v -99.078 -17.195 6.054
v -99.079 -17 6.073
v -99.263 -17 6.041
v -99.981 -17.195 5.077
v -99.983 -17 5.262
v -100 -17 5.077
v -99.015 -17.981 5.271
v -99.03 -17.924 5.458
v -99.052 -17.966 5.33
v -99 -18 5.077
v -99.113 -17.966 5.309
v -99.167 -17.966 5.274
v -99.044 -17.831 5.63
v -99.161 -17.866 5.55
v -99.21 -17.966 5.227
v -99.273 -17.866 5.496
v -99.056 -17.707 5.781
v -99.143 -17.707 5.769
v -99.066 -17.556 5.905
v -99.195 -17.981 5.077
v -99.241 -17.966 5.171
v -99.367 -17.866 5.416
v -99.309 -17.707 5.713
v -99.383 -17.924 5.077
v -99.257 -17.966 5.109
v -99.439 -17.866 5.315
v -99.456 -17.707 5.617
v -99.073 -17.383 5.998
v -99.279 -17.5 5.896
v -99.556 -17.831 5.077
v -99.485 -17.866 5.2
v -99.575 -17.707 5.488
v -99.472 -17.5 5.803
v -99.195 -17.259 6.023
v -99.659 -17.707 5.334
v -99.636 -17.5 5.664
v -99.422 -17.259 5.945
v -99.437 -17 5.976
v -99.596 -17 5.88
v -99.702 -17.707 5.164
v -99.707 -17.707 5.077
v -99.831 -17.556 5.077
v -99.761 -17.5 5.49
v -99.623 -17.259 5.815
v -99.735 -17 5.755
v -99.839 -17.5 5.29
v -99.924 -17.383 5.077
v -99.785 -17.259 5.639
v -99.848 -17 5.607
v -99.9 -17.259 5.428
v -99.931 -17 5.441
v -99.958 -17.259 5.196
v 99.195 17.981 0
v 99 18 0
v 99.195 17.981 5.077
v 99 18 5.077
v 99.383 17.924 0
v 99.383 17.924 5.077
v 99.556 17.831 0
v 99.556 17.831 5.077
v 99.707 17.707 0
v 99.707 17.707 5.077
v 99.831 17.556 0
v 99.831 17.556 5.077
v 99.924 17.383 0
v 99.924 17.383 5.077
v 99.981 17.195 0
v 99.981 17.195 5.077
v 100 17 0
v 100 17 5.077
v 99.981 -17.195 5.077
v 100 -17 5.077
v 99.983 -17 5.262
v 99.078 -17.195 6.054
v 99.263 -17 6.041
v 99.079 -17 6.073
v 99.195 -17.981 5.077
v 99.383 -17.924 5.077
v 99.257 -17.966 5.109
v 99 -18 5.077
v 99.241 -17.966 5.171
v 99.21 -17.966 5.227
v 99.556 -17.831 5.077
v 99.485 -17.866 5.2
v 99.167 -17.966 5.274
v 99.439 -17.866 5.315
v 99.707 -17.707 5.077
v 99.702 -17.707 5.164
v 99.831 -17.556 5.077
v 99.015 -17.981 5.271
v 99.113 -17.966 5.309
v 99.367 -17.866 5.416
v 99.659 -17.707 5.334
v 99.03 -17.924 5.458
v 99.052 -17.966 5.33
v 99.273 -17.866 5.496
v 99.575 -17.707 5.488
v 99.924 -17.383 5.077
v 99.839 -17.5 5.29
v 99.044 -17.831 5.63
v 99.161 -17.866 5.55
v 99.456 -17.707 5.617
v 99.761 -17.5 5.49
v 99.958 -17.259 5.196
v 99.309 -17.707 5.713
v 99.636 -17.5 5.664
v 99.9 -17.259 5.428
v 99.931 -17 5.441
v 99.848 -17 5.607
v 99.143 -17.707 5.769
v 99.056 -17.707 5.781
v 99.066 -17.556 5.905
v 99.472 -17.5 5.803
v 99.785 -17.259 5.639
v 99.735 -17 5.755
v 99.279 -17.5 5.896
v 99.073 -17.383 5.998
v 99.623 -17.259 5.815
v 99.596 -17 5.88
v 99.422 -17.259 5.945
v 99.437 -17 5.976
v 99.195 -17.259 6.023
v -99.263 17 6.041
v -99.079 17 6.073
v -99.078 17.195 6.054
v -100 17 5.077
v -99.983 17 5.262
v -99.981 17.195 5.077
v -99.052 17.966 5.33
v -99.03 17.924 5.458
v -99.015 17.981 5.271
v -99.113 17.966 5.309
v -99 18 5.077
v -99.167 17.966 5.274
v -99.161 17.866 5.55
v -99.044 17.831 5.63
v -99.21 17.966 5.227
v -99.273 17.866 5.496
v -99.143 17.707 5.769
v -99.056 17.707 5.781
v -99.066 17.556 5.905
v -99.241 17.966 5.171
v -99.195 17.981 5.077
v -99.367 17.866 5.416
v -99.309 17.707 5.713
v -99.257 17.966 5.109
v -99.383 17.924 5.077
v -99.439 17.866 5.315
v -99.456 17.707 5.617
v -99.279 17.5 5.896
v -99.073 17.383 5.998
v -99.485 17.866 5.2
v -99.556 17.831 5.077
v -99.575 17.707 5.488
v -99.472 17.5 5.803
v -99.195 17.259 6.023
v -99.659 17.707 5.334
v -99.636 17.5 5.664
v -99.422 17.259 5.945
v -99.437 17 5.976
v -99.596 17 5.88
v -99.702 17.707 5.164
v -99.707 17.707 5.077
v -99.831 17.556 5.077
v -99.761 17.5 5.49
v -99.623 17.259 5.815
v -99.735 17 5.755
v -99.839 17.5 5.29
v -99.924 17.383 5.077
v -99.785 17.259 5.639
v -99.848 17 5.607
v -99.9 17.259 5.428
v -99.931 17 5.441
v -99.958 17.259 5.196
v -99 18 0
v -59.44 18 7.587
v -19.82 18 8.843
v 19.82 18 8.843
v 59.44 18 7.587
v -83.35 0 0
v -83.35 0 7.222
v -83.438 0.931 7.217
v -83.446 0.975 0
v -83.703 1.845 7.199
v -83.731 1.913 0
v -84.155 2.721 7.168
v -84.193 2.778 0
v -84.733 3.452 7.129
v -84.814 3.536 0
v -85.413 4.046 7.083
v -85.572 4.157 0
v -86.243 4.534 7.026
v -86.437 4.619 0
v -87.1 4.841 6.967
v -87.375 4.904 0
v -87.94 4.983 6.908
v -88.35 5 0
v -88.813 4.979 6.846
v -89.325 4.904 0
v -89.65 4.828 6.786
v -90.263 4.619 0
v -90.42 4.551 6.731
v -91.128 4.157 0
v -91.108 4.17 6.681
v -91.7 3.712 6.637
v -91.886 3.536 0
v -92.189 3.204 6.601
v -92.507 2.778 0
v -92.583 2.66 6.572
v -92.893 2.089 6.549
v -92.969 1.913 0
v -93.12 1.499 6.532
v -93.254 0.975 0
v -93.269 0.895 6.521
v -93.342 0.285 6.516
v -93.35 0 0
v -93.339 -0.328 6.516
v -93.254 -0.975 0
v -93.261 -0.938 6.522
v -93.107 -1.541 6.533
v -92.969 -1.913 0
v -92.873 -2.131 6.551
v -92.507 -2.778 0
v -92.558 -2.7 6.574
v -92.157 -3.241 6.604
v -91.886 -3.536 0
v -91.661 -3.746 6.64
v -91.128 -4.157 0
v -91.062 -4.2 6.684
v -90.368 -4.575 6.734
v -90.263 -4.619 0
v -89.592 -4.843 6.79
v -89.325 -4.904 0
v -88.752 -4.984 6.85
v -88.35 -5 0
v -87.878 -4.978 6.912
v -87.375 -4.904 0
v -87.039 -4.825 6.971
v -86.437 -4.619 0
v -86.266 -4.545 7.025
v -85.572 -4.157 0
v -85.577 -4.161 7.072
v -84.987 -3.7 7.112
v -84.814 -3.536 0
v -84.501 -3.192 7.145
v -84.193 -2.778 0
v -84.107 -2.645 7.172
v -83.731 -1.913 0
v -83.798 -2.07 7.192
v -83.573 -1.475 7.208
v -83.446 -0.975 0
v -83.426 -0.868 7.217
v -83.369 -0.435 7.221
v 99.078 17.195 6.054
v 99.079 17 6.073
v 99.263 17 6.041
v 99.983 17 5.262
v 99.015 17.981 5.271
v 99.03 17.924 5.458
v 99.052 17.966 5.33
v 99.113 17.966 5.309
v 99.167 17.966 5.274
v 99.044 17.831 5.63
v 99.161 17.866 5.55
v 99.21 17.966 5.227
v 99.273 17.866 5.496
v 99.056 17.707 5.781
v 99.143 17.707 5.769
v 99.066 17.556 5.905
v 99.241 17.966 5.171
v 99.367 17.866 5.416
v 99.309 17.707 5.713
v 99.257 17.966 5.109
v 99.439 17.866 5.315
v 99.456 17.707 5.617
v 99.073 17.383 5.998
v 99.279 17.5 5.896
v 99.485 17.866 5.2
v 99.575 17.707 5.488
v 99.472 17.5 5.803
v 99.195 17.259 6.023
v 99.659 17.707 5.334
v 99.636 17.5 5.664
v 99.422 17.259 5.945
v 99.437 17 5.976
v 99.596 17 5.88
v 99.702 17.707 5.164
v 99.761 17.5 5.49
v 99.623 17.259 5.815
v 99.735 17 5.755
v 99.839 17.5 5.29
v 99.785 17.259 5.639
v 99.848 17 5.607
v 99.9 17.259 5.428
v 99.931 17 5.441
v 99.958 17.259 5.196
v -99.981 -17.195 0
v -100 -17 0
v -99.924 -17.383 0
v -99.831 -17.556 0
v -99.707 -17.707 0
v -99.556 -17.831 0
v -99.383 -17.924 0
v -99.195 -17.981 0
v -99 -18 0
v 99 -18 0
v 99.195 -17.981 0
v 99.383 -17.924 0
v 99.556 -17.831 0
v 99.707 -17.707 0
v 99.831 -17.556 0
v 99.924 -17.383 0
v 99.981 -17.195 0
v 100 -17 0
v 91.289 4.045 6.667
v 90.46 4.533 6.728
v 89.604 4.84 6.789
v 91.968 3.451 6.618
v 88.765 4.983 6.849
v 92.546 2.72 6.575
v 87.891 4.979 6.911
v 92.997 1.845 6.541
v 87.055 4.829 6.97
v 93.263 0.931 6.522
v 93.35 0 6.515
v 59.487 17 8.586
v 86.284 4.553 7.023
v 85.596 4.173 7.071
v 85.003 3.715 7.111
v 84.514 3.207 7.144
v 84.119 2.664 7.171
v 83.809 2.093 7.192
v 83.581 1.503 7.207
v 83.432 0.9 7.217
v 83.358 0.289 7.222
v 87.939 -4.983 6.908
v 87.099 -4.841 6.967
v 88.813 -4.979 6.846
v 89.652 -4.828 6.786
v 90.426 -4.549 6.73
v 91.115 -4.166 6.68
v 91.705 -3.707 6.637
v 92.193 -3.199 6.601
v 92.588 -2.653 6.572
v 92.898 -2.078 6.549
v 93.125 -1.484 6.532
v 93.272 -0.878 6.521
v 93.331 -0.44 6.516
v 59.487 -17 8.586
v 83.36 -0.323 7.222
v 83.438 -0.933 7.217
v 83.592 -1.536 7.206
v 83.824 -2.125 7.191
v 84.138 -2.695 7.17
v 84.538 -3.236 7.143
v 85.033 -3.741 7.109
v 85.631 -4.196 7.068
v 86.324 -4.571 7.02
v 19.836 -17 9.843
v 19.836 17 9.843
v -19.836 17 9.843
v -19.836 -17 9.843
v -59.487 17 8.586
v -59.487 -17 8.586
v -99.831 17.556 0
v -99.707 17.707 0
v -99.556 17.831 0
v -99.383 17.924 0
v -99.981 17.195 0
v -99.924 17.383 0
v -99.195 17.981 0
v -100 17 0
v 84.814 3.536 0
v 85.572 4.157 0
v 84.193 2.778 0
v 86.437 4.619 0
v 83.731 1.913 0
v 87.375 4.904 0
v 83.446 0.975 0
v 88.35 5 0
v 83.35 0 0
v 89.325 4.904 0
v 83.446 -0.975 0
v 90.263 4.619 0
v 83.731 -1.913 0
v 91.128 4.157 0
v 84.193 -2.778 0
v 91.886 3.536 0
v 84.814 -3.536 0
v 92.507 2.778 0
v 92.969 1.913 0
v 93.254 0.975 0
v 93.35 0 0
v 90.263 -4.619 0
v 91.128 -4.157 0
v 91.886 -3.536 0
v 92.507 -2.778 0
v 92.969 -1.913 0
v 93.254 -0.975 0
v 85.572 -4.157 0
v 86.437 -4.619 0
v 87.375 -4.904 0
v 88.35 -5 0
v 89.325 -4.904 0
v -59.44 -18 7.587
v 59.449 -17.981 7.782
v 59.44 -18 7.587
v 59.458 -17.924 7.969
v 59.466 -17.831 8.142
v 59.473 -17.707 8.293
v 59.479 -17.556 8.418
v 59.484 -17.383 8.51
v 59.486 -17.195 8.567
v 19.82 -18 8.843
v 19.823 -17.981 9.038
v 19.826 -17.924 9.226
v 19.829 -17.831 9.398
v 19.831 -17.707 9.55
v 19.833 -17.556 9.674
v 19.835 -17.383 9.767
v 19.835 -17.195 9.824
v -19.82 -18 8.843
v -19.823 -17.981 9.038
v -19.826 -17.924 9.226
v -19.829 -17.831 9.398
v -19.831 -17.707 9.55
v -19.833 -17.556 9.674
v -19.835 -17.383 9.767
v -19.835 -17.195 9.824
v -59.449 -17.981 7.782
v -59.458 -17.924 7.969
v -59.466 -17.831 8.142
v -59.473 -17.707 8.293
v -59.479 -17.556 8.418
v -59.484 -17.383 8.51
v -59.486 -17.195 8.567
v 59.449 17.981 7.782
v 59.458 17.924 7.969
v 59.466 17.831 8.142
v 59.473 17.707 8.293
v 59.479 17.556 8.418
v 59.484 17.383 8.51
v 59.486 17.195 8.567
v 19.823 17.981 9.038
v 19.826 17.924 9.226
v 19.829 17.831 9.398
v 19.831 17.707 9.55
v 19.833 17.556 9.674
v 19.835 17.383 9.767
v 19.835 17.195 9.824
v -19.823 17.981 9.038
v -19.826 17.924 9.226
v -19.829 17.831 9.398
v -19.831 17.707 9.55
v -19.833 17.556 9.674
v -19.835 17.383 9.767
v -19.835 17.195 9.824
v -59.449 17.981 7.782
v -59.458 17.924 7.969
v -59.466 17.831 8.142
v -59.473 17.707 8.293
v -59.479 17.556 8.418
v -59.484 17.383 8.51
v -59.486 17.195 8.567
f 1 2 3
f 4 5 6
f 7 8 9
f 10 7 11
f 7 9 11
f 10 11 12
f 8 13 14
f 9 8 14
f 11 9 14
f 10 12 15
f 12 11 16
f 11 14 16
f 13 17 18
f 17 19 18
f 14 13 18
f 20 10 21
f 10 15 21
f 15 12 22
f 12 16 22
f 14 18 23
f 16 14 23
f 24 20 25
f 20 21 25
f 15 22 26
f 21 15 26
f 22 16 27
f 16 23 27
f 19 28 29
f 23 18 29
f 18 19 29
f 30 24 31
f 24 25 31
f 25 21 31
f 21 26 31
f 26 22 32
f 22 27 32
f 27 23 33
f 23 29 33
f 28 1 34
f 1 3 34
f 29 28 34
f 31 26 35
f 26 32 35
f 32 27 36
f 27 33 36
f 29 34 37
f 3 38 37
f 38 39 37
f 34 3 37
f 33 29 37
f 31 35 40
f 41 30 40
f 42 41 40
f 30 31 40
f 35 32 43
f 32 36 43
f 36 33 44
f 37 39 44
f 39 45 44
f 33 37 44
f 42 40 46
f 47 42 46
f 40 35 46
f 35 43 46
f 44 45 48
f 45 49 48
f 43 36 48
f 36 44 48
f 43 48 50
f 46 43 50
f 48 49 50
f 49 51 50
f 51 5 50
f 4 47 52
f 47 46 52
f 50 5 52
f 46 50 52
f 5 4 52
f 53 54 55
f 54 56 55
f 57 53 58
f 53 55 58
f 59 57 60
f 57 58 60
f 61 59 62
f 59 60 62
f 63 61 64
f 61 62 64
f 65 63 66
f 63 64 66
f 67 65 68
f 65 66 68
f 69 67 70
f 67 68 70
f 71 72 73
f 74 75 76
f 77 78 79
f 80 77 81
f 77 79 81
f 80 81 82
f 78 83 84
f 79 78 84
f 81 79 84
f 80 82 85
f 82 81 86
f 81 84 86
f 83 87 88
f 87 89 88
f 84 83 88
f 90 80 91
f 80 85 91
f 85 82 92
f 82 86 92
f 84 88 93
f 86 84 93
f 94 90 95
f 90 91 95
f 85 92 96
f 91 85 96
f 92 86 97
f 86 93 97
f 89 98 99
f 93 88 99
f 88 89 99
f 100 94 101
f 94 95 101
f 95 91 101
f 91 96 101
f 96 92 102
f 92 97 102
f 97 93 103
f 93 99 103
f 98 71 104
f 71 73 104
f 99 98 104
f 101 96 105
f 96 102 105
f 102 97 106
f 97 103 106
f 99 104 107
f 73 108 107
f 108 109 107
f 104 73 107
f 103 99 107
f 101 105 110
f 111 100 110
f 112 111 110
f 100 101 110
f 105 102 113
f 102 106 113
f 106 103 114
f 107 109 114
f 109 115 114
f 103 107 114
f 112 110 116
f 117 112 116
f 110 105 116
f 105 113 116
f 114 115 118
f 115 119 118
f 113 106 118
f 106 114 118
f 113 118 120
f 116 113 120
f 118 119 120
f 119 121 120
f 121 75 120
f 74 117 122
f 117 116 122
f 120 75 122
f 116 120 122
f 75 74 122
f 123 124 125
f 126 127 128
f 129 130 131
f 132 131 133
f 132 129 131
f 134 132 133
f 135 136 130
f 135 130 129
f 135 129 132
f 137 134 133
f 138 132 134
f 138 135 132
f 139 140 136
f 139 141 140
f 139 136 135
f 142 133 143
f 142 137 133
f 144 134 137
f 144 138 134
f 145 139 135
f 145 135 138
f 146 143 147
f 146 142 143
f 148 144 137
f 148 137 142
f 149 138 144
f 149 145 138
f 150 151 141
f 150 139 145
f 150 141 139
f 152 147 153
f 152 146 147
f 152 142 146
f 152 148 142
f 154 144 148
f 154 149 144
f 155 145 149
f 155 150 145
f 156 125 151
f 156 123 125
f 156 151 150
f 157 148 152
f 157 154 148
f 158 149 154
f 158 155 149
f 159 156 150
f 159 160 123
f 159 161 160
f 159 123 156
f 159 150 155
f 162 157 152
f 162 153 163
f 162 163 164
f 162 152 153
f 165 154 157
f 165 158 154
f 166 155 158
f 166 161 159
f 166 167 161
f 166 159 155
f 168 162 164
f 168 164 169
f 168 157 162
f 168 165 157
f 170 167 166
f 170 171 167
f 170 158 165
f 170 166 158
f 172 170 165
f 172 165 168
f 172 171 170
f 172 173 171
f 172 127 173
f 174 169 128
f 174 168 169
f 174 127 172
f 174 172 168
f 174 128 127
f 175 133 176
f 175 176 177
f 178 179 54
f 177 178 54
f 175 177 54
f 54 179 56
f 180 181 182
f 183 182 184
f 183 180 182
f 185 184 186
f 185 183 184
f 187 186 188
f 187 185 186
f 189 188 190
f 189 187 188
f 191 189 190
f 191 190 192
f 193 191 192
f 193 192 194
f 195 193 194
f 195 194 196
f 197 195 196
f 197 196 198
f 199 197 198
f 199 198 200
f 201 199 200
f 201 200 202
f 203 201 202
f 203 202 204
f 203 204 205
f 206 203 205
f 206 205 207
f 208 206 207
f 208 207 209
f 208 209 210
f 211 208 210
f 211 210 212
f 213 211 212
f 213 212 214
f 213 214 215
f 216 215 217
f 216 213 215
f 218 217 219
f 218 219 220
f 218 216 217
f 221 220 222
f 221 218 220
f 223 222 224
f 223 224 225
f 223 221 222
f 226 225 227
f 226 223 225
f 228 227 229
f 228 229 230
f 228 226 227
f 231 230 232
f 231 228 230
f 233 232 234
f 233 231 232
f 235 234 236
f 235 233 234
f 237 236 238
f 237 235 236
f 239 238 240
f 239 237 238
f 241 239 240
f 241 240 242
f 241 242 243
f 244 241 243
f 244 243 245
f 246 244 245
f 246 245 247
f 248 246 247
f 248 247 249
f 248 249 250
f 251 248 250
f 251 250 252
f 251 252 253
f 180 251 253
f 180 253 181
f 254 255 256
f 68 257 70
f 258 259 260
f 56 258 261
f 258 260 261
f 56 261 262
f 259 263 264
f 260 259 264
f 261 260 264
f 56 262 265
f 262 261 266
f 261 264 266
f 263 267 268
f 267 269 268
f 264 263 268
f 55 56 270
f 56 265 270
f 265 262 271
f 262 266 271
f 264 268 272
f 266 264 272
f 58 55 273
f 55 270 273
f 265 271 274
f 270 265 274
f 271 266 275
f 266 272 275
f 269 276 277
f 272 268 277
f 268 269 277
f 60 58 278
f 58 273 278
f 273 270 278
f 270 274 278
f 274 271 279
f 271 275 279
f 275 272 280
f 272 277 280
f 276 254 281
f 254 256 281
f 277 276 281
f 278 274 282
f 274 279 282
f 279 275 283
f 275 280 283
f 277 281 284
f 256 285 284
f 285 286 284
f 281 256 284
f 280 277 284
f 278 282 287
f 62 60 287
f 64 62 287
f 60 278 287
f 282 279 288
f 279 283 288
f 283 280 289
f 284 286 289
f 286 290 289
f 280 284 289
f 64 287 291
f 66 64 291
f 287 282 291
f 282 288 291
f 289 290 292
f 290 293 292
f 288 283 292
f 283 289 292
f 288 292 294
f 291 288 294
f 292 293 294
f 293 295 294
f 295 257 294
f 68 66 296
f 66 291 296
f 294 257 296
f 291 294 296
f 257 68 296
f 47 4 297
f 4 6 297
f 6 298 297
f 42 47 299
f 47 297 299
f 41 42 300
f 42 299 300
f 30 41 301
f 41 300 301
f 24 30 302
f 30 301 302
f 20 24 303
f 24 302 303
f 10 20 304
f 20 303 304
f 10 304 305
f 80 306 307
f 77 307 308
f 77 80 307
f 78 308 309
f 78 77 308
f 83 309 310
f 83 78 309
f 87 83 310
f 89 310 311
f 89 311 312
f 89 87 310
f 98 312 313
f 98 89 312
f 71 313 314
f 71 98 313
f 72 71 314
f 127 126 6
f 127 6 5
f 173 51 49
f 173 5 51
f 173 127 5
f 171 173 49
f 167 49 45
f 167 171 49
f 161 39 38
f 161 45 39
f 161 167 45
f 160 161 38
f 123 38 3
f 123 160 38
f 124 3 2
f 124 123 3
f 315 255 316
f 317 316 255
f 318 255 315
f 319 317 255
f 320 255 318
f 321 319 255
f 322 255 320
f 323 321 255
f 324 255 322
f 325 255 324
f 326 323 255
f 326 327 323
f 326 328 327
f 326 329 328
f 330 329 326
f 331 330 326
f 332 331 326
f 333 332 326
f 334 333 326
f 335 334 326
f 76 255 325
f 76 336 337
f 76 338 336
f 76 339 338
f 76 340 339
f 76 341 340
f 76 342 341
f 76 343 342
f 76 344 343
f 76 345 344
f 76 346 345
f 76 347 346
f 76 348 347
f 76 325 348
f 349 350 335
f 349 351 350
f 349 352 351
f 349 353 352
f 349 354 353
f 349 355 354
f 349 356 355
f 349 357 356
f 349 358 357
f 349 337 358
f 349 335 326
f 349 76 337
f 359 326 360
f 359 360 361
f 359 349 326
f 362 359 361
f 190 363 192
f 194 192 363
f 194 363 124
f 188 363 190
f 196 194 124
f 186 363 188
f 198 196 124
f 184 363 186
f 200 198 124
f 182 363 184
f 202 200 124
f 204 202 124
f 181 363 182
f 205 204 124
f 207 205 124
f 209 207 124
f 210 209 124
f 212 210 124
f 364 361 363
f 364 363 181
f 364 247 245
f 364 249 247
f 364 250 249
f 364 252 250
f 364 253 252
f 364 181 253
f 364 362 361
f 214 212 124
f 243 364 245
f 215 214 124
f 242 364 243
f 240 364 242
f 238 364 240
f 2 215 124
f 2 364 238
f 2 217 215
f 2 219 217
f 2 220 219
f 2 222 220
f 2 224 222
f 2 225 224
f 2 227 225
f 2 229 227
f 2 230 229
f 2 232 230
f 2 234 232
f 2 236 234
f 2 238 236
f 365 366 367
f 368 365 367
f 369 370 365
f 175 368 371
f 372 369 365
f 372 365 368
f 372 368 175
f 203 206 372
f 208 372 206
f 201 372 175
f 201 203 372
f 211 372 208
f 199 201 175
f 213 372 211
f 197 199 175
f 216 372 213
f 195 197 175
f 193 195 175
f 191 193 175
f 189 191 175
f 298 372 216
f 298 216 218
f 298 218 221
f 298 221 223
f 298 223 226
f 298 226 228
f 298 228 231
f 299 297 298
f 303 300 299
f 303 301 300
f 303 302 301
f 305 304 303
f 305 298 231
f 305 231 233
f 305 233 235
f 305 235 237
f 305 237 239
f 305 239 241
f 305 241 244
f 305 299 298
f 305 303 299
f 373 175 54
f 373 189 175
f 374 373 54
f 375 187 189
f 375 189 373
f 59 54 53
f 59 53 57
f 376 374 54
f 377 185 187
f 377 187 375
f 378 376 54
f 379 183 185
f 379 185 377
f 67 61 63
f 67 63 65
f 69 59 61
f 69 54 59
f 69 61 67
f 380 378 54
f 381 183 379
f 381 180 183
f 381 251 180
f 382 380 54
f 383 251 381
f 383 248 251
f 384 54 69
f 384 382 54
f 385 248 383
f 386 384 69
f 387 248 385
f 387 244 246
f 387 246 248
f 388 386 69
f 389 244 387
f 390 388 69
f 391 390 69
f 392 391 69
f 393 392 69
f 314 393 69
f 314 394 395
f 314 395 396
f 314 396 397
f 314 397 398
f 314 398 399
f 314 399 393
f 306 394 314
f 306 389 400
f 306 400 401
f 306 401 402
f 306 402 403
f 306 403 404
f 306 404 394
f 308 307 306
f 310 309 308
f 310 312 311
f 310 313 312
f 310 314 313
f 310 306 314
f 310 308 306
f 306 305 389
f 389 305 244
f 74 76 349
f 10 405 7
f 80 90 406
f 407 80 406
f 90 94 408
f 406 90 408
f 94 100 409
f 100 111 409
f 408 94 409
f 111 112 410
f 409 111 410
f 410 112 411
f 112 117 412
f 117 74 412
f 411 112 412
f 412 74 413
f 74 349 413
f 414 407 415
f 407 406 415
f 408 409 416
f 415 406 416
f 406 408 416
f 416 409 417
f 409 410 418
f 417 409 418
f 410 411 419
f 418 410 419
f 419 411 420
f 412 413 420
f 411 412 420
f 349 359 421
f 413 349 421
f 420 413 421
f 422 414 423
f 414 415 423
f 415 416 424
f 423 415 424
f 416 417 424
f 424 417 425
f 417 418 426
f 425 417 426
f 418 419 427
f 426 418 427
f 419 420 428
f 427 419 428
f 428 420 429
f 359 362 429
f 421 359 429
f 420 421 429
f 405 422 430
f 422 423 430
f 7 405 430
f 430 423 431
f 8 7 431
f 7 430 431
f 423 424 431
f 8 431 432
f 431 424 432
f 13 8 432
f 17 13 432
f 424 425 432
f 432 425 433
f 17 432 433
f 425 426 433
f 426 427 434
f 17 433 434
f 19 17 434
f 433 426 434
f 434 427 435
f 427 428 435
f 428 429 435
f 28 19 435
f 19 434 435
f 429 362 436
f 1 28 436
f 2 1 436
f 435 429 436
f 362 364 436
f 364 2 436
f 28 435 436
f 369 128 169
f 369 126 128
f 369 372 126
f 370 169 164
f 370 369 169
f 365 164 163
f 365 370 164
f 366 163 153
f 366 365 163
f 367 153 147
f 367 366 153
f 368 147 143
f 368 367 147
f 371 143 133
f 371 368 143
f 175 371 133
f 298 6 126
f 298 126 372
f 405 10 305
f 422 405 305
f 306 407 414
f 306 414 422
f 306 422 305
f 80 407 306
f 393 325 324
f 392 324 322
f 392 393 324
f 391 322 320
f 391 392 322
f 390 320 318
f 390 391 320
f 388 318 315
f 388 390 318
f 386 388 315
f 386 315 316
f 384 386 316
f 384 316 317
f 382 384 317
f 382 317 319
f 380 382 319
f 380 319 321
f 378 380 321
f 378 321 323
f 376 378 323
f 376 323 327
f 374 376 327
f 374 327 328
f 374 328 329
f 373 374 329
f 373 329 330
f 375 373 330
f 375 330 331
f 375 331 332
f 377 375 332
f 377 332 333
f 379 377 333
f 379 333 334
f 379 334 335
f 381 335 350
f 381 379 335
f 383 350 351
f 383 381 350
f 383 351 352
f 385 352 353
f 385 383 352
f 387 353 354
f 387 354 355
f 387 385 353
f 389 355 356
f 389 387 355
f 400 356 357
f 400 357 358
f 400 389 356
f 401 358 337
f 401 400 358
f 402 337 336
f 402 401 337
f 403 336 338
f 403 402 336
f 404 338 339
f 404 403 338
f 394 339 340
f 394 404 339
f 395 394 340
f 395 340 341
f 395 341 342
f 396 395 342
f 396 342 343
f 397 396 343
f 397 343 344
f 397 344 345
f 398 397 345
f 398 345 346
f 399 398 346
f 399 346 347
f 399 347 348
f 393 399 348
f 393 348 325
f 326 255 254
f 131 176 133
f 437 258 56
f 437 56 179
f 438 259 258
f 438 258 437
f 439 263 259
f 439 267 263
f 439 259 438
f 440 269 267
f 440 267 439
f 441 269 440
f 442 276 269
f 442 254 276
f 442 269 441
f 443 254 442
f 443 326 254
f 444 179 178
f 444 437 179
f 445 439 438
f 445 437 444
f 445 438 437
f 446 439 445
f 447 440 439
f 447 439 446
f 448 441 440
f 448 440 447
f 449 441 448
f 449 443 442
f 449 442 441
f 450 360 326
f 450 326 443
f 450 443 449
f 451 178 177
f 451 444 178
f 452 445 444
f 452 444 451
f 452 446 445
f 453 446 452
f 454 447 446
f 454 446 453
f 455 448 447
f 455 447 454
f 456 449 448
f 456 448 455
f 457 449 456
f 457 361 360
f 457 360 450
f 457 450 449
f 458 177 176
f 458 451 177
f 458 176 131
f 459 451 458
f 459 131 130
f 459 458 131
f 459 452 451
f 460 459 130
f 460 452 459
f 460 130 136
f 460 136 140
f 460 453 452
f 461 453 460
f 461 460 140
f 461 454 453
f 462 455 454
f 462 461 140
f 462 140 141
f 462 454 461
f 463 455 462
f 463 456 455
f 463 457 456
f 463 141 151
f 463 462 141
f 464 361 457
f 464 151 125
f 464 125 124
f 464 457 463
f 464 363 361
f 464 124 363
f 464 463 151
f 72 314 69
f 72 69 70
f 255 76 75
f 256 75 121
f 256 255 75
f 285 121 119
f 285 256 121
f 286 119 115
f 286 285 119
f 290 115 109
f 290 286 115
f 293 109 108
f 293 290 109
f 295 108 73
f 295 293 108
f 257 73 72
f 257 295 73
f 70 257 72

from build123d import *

# Parameters (mm, degrees)
F1_DEPTH      = 18
F1_DEPTH_BACK = 18
F2_R          = 5
F3_DEPTH      = 25
F4_R          = 1


with BuildPart() as f1:
    # F0 (on Front) → F1 (new body, two sides)
    with BuildSketch(Plane.XZ) as f1_sk:
        with BuildLine():
            Line((-100, 6), (-100, 0))
            Line((-100, 0), (100, 0))
            Line((100, 0), (100, 6))
            ThreePointArc((100, 6), (0, 10), (-100, 6))
        make_face()
    extrude(amount=F1_DEPTH)
    extrude(f1_sk.sketch, amount=-F1_DEPTH_BACK)

    # F2 (on Top) → F3 (cut)
    with BuildSketch(Plane.XY):
        with Locations((-88.35, 0)):
            Circle(F2_R)
        with Locations((88.35, 0)):
            Circle(F2_R)
    extrude(amount=F3_DEPTH, mode=Mode.SUBTRACT)

    # F4
    f4_edges = [f1.edges().sort_by_distance(p)[0] for p in [
        (-100, 0, 6),
        (0, -18, 10),
        (100, 0, 6),
        (0, 18, 10),
        (100, -18, 3),
        (100, 18, 3),
        (-100, 18, 3),
        (-100, -18, 3),
    ]]
    fillet(f4_edges, radius=F4_R)


solid = f1.part
